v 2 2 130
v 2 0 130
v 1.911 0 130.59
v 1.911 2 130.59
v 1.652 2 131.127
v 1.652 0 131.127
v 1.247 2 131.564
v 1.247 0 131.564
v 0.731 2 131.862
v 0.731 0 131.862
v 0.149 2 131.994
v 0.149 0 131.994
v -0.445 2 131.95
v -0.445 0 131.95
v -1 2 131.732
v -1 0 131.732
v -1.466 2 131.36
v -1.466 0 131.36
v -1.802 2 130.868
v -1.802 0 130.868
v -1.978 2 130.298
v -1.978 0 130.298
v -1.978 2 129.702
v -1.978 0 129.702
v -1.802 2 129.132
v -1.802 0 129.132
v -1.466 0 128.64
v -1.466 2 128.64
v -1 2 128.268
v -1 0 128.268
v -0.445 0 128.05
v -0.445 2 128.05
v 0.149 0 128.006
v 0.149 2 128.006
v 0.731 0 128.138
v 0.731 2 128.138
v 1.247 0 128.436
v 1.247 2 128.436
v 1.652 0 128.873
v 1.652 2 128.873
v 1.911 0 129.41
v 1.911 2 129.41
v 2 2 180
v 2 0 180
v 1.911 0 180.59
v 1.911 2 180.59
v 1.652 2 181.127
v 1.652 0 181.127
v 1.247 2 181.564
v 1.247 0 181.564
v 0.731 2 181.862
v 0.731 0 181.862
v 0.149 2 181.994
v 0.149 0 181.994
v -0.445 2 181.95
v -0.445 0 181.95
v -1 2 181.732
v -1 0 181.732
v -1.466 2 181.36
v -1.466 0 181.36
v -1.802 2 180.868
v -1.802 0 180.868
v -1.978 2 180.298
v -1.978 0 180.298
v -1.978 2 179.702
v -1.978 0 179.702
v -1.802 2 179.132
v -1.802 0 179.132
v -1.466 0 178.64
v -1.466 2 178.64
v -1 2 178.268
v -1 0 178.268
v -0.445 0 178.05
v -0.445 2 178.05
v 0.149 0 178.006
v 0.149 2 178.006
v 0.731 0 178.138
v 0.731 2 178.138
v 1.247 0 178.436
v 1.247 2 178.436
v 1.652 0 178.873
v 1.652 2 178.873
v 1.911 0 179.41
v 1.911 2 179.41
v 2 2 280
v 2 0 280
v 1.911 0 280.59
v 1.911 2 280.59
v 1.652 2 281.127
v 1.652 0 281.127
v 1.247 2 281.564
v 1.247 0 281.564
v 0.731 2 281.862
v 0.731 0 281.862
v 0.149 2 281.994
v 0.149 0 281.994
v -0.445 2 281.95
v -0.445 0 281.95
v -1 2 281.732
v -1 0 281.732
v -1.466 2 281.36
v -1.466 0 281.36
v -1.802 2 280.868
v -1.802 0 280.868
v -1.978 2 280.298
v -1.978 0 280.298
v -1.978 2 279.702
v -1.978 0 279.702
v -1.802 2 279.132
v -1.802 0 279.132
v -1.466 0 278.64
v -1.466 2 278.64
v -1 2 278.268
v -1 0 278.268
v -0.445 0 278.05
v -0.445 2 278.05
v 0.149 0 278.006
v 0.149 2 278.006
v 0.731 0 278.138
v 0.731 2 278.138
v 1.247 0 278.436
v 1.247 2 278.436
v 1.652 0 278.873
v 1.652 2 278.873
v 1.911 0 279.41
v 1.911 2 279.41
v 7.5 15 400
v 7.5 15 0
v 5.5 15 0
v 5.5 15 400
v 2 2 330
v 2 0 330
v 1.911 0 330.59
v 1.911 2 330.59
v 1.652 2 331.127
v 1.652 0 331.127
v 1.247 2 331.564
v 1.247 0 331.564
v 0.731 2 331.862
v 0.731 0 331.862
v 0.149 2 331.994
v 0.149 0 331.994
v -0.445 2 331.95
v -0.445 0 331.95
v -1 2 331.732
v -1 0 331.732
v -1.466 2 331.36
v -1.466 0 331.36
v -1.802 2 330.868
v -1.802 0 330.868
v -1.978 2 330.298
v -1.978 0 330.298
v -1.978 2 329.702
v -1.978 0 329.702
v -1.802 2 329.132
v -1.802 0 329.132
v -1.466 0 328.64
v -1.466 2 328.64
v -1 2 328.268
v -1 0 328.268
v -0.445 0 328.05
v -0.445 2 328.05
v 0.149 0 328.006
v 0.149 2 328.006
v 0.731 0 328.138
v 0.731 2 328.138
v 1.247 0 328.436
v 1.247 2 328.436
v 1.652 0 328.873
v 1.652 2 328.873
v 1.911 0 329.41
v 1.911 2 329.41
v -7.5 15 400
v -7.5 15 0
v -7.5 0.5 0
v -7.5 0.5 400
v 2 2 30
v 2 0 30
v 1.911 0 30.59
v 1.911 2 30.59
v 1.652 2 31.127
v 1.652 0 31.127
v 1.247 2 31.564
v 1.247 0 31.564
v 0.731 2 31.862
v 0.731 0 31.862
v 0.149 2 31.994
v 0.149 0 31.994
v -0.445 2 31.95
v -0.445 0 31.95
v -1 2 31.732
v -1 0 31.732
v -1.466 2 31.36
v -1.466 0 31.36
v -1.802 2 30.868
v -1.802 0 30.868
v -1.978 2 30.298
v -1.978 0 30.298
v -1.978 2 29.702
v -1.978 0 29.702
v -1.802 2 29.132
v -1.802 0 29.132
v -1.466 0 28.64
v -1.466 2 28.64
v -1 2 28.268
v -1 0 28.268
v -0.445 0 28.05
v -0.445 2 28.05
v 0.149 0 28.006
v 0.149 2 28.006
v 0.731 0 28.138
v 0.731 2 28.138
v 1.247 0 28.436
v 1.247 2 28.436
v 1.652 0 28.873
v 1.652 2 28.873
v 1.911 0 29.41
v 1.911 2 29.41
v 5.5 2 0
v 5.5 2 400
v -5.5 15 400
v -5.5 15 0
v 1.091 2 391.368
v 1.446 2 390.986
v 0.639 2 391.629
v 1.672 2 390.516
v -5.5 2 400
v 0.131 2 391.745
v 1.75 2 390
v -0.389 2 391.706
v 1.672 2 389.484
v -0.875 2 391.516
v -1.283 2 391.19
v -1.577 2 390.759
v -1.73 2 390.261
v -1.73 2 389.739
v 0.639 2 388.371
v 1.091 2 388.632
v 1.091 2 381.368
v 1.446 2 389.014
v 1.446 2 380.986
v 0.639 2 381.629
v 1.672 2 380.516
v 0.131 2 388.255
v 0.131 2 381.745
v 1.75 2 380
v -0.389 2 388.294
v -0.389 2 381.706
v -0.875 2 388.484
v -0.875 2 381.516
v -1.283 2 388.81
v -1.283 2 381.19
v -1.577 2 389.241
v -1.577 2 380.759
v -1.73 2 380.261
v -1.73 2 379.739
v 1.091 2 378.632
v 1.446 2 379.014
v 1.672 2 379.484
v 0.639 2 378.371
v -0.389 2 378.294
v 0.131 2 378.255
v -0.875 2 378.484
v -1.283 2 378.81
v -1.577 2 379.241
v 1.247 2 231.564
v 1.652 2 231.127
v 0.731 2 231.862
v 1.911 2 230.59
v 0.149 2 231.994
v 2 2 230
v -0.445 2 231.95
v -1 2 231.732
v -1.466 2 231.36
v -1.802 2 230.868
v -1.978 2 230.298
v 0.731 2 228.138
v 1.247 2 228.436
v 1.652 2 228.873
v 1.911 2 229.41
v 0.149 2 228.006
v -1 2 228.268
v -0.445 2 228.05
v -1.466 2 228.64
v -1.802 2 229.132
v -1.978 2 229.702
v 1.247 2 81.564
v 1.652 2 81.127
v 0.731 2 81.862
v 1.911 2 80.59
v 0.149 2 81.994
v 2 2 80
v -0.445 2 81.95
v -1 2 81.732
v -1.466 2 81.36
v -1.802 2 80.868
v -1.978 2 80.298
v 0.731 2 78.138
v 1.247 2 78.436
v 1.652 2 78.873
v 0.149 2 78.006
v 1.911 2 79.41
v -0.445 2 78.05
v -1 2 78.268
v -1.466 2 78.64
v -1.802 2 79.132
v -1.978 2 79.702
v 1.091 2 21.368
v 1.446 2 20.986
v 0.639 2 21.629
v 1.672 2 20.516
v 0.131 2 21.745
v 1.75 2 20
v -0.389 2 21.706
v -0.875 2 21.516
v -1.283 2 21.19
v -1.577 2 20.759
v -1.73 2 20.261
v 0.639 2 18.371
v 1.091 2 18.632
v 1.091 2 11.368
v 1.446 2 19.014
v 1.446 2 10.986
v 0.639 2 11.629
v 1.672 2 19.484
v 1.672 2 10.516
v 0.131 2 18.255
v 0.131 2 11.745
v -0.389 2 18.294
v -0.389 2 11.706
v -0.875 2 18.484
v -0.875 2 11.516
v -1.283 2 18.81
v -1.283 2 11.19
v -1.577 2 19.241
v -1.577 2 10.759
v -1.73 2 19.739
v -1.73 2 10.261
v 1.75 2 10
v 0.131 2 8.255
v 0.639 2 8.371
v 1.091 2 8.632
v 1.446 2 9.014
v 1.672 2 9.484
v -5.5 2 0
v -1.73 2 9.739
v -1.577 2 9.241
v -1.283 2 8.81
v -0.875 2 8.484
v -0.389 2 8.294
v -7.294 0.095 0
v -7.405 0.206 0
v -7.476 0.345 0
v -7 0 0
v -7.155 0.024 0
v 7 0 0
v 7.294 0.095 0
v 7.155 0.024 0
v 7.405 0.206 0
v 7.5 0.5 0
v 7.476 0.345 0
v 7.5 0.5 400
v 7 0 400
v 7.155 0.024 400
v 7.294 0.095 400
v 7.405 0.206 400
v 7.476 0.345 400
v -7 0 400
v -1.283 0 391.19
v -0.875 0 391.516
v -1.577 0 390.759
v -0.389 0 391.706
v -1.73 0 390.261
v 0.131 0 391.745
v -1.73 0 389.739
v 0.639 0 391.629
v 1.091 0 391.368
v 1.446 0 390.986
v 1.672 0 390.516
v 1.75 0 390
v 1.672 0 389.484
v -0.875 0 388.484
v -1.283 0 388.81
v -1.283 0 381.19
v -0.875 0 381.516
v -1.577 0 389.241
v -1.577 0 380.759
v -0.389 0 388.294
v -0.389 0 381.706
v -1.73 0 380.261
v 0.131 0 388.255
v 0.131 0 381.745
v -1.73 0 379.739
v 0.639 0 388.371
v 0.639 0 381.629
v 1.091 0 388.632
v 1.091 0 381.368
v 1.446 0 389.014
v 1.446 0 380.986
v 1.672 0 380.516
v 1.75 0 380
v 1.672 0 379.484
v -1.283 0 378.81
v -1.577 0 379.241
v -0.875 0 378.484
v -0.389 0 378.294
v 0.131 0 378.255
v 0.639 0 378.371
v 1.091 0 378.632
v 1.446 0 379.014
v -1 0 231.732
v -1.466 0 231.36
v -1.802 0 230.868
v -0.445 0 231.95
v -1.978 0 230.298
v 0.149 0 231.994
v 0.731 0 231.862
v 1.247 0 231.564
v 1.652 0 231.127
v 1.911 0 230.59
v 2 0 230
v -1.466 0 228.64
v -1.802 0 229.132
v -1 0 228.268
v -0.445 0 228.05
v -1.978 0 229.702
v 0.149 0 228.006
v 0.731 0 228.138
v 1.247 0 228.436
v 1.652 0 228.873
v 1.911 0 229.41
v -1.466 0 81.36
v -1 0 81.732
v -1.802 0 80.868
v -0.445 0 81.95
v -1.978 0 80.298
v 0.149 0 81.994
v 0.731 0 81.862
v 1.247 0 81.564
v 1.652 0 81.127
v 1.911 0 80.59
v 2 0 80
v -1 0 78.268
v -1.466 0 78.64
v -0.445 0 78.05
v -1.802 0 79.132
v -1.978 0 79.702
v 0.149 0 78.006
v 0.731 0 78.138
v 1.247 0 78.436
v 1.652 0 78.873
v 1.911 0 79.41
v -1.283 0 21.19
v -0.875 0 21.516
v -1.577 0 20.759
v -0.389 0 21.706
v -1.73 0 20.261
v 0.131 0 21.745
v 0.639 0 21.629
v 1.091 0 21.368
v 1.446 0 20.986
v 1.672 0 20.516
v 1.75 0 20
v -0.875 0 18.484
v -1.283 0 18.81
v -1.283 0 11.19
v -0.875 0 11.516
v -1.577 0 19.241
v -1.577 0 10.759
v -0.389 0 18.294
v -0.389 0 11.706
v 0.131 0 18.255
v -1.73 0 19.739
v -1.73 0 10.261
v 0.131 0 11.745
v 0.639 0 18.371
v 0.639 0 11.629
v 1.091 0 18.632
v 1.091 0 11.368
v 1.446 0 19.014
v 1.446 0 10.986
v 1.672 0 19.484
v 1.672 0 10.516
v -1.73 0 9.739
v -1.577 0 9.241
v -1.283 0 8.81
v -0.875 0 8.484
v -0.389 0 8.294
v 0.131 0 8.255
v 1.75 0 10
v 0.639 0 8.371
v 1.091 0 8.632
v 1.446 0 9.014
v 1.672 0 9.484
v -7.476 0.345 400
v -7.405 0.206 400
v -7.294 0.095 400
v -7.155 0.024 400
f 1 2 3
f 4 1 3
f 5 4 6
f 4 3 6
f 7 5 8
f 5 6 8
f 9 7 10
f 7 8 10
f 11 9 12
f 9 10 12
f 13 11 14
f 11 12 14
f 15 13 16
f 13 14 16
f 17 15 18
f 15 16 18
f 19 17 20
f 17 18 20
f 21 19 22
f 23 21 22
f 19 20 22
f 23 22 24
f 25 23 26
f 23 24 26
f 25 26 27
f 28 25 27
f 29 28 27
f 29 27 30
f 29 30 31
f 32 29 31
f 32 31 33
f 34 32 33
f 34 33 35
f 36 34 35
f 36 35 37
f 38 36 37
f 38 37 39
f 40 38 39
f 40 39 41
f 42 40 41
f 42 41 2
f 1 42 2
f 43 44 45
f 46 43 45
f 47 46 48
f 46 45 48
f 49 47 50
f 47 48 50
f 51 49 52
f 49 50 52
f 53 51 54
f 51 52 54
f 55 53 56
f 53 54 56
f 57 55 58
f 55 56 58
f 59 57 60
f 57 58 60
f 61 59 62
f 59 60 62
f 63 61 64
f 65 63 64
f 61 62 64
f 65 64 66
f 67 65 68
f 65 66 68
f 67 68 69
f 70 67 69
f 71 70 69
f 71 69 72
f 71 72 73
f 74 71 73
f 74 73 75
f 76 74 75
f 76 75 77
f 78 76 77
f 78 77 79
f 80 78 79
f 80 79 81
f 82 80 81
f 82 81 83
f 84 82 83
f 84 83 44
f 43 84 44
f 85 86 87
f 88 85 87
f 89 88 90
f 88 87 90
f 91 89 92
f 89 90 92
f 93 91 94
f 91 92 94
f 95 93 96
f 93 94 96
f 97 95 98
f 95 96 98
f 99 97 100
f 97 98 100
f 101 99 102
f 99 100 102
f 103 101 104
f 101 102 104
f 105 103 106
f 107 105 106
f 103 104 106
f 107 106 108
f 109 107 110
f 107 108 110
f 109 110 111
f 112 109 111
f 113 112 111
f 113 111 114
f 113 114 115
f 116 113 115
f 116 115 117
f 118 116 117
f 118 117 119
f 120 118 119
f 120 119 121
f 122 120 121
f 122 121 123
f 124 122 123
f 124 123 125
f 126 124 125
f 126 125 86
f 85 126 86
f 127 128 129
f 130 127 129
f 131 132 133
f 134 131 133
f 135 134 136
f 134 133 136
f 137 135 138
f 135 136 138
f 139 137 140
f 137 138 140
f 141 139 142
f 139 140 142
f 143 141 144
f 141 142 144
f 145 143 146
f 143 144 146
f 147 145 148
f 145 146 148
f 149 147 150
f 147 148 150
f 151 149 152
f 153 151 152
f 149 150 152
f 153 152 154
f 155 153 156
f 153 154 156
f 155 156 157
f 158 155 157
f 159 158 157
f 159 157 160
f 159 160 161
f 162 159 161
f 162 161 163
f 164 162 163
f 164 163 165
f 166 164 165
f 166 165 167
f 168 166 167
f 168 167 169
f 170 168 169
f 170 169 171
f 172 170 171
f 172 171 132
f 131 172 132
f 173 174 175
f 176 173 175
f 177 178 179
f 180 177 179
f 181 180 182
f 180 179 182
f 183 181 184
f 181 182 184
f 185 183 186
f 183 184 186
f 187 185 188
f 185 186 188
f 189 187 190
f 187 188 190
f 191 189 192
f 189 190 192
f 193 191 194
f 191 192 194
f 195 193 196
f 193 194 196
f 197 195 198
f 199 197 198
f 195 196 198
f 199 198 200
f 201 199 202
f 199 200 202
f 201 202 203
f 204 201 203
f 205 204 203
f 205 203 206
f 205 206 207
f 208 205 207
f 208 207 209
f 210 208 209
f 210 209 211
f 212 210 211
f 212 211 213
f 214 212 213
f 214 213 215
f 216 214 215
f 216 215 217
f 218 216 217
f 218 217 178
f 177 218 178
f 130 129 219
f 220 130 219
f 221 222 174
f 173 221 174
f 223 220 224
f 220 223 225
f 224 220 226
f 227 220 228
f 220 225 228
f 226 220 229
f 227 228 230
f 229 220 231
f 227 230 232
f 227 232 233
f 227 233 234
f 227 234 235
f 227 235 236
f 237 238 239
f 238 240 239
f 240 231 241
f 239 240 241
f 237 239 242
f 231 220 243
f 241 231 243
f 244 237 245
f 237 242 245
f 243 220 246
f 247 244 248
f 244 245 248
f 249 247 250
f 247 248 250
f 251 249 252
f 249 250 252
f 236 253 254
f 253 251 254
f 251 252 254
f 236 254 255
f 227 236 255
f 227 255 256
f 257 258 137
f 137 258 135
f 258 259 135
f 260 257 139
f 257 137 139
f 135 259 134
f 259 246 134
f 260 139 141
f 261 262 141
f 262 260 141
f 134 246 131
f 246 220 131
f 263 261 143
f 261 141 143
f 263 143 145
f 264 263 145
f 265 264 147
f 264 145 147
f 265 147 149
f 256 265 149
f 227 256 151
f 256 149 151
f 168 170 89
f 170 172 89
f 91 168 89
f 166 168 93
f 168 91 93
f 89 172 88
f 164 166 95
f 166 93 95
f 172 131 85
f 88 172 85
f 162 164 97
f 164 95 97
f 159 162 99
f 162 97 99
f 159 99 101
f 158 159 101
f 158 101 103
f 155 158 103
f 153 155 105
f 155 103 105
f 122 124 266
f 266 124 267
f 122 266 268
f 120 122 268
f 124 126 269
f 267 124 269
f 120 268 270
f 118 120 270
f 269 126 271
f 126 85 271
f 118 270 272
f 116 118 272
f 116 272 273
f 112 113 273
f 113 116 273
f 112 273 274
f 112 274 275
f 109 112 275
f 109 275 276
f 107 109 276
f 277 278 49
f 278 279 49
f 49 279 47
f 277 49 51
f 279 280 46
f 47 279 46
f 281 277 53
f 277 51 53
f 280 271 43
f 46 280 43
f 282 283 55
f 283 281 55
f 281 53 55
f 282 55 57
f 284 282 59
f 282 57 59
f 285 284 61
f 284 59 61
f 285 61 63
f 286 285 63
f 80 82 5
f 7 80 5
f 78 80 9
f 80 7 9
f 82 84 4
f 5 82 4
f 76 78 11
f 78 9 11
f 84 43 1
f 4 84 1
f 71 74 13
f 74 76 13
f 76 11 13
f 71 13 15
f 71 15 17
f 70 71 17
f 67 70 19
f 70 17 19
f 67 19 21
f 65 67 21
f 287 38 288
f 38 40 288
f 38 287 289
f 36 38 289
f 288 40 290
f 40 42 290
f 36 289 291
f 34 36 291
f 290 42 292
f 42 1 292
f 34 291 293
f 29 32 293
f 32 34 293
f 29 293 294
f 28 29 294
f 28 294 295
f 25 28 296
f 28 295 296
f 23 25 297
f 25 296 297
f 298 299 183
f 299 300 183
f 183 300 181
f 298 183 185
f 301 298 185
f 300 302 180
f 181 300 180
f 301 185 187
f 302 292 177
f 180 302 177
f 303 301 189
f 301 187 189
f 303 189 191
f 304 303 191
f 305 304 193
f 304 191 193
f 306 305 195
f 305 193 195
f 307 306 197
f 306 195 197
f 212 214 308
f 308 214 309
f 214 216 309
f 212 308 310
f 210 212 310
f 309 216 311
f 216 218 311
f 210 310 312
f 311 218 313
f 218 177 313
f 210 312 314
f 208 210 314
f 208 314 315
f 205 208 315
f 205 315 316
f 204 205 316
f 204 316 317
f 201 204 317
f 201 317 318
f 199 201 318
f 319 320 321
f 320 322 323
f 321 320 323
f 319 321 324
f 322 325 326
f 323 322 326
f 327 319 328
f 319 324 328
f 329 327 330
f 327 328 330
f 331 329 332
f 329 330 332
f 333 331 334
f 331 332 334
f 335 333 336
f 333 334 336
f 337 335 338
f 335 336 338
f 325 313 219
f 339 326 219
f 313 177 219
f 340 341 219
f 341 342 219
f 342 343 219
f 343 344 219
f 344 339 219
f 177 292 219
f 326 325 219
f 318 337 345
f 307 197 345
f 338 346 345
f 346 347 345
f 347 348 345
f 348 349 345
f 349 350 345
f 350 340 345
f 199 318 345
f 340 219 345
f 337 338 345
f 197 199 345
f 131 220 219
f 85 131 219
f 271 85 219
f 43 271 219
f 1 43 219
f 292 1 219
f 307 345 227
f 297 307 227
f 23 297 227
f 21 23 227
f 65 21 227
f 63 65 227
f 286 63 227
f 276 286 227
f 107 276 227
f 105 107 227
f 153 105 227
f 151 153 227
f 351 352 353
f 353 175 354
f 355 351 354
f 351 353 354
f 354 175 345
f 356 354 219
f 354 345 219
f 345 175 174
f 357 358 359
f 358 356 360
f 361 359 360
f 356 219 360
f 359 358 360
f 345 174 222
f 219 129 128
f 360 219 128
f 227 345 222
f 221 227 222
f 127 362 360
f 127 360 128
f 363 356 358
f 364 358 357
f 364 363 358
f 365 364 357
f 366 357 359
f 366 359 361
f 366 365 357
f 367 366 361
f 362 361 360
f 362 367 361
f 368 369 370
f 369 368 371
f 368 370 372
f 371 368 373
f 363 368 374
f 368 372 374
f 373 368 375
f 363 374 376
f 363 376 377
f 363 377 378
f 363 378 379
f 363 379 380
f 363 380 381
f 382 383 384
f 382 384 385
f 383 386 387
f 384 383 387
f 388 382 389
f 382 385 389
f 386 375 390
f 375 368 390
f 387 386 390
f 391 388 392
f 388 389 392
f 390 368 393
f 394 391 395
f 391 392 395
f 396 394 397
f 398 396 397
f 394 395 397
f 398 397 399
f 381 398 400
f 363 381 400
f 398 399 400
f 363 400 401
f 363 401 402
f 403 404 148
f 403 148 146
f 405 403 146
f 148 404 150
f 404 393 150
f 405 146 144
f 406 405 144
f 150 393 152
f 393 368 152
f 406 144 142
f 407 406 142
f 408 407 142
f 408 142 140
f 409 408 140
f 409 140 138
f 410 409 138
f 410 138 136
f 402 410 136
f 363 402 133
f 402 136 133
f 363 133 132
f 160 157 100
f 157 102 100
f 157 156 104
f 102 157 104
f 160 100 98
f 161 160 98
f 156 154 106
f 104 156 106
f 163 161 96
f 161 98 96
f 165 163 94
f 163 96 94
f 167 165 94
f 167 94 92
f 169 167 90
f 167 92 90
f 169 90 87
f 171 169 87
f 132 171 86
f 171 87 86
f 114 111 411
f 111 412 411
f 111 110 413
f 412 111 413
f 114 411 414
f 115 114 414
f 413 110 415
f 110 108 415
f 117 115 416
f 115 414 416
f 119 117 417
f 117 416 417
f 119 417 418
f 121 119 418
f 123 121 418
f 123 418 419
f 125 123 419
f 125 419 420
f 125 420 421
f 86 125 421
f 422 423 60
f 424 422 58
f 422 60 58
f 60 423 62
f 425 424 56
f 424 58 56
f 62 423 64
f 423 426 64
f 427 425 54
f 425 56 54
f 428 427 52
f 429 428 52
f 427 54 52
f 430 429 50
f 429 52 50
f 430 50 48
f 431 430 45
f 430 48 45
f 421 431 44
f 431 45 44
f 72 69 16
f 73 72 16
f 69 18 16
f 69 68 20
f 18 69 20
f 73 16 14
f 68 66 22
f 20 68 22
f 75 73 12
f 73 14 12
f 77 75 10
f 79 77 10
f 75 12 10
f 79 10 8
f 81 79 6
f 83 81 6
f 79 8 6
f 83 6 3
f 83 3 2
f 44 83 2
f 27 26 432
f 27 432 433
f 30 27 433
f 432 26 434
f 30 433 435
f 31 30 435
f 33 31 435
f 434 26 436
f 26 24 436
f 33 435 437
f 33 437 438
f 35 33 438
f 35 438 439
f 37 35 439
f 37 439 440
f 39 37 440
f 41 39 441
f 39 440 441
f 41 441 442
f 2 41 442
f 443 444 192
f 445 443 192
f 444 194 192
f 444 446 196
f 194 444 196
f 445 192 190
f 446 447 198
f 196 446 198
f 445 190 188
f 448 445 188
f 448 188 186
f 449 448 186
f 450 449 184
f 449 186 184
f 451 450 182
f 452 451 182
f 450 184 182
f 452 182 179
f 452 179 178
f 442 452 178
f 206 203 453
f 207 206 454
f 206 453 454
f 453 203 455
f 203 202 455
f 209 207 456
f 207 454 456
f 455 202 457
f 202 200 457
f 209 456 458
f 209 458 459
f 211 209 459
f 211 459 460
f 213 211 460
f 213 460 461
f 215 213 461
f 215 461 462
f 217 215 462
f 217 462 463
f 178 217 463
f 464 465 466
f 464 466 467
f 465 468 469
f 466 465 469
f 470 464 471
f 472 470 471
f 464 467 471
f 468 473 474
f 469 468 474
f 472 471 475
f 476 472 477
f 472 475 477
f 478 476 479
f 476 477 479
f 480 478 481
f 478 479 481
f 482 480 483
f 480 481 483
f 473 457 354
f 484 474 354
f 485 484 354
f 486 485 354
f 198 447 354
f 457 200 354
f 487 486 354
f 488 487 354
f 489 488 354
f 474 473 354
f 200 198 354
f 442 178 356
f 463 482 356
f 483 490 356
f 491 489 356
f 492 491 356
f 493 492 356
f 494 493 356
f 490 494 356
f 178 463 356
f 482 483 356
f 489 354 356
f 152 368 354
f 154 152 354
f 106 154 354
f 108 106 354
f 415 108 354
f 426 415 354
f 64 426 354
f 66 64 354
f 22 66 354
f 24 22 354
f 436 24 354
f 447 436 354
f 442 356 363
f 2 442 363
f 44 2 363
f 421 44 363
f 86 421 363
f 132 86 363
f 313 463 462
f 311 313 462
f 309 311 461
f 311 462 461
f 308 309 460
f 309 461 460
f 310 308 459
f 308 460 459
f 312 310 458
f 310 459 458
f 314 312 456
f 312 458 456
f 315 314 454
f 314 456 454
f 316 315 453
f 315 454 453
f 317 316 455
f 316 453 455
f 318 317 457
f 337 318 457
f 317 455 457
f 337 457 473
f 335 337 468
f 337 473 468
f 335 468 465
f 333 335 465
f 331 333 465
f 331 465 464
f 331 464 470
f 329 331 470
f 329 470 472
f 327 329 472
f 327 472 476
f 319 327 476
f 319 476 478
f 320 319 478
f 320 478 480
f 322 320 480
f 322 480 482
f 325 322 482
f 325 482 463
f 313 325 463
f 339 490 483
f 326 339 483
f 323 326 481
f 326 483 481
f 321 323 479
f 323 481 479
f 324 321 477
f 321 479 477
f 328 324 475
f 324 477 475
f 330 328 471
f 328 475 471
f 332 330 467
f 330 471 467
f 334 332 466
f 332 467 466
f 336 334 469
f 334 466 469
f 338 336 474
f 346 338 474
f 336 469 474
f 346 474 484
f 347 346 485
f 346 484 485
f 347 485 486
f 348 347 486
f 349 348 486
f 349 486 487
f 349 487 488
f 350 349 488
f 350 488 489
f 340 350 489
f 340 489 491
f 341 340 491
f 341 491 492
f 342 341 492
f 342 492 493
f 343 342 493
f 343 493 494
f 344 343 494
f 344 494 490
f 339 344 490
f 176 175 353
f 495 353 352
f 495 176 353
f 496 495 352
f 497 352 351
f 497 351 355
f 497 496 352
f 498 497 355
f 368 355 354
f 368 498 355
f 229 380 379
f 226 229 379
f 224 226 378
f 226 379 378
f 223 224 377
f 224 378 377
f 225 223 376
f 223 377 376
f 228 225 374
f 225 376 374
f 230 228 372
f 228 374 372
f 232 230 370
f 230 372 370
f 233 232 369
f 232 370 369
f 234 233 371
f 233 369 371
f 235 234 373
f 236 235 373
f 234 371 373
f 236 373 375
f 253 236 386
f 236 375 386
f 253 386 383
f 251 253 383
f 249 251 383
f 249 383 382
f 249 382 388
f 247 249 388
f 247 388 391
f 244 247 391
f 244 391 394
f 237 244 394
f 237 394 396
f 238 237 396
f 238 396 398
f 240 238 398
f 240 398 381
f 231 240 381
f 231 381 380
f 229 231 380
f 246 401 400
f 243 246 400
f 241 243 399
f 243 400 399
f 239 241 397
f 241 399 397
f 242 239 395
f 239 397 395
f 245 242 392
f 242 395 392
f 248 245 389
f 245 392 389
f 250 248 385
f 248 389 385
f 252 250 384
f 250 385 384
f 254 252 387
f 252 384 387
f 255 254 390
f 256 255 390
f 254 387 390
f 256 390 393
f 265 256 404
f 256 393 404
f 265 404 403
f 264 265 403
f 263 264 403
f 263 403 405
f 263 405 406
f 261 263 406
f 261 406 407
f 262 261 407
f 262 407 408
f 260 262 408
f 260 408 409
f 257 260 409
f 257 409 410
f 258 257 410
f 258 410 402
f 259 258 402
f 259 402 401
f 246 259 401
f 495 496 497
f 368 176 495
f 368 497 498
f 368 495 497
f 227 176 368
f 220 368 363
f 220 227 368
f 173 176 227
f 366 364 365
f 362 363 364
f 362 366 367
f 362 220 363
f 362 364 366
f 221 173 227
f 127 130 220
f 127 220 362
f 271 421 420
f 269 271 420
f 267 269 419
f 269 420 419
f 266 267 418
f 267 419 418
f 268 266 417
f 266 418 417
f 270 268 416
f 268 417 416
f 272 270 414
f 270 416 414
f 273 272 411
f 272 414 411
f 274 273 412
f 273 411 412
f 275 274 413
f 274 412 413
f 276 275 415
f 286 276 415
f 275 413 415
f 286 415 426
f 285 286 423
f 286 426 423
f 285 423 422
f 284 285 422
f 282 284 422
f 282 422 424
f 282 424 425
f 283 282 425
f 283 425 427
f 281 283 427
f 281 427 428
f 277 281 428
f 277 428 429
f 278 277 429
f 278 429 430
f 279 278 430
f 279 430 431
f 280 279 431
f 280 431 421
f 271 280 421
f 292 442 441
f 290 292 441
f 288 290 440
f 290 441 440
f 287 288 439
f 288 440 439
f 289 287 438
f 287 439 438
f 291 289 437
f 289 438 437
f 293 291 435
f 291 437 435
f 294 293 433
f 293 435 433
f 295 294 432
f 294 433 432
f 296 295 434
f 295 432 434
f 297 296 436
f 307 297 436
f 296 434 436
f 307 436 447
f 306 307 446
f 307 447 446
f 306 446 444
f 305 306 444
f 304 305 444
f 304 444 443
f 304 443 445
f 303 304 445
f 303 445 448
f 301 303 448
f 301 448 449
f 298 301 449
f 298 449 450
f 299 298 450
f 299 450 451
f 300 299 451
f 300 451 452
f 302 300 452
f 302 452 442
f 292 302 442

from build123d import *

# Parameters (mm, degrees)
SALIENTE_EXTRUIR1_DEPTH = 400
REDONDEO1_R             = 0.5
CROQUIS2_R              = 2
CROQUIS2_R_2            = 1.75
CORTAR_EXTRUIR1_DEPTH   = 16


with BuildPart() as part:
    # Croquis1 → Saliente-Extruir1 (new body)
    with BuildSketch(Plane.XY):
        Polygon((-7.5, 15), (-7.5, 0), (7.5, 0), (7.5, 15), (5.5, 15), (5.5, 2), (-5.5, 2), (-5.5, 15), align=None)
    extrude(amount=SALIENTE_EXTRUIR1_DEPTH)

    # Redondeo1
    redondeo1_edges = [part.edges().sort_by_distance(p)[0] for p in [
        (7.5, 0, 200),
        (-7.5, 0, 200),
    ]]
    fillet(redondeo1_edges, radius=REDONDEO1_R)

    # Croquis2 → Cortar-Extruir1 (cut, through all)
    with BuildSketch(Plane.XZ):
        with Locations((0, 280)):
            Circle(CROQUIS2_R)
        with Locations((0, 330)):
            Circle(CROQUIS2_R)
        with Locations((0, 390)):
            Circle(CROQUIS2_R_2)
        with Locations((0, 380)):
            Circle(CROQUIS2_R_2)
        with Locations((0, 10)):
            Circle(CROQUIS2_R_2)
        with Locations((0, 20)):
            Circle(CROQUIS2_R_2)
        with Locations((0, 230)):
            Circle(CROQUIS2_R)
        with Locations((0, 180)):
            Circle(CROQUIS2_R)
        with Locations((0, 130)):
            Circle(CROQUIS2_R)
        with Locations((0, 80)):
            Circle(CROQUIS2_R)
        with Locations((0, 30)):
            Circle(CROQUIS2_R)
    extrude(amount=-CORTAR_EXTRUIR1_DEPTH, mode=Mode.SUBTRACT)


solid = part.part
